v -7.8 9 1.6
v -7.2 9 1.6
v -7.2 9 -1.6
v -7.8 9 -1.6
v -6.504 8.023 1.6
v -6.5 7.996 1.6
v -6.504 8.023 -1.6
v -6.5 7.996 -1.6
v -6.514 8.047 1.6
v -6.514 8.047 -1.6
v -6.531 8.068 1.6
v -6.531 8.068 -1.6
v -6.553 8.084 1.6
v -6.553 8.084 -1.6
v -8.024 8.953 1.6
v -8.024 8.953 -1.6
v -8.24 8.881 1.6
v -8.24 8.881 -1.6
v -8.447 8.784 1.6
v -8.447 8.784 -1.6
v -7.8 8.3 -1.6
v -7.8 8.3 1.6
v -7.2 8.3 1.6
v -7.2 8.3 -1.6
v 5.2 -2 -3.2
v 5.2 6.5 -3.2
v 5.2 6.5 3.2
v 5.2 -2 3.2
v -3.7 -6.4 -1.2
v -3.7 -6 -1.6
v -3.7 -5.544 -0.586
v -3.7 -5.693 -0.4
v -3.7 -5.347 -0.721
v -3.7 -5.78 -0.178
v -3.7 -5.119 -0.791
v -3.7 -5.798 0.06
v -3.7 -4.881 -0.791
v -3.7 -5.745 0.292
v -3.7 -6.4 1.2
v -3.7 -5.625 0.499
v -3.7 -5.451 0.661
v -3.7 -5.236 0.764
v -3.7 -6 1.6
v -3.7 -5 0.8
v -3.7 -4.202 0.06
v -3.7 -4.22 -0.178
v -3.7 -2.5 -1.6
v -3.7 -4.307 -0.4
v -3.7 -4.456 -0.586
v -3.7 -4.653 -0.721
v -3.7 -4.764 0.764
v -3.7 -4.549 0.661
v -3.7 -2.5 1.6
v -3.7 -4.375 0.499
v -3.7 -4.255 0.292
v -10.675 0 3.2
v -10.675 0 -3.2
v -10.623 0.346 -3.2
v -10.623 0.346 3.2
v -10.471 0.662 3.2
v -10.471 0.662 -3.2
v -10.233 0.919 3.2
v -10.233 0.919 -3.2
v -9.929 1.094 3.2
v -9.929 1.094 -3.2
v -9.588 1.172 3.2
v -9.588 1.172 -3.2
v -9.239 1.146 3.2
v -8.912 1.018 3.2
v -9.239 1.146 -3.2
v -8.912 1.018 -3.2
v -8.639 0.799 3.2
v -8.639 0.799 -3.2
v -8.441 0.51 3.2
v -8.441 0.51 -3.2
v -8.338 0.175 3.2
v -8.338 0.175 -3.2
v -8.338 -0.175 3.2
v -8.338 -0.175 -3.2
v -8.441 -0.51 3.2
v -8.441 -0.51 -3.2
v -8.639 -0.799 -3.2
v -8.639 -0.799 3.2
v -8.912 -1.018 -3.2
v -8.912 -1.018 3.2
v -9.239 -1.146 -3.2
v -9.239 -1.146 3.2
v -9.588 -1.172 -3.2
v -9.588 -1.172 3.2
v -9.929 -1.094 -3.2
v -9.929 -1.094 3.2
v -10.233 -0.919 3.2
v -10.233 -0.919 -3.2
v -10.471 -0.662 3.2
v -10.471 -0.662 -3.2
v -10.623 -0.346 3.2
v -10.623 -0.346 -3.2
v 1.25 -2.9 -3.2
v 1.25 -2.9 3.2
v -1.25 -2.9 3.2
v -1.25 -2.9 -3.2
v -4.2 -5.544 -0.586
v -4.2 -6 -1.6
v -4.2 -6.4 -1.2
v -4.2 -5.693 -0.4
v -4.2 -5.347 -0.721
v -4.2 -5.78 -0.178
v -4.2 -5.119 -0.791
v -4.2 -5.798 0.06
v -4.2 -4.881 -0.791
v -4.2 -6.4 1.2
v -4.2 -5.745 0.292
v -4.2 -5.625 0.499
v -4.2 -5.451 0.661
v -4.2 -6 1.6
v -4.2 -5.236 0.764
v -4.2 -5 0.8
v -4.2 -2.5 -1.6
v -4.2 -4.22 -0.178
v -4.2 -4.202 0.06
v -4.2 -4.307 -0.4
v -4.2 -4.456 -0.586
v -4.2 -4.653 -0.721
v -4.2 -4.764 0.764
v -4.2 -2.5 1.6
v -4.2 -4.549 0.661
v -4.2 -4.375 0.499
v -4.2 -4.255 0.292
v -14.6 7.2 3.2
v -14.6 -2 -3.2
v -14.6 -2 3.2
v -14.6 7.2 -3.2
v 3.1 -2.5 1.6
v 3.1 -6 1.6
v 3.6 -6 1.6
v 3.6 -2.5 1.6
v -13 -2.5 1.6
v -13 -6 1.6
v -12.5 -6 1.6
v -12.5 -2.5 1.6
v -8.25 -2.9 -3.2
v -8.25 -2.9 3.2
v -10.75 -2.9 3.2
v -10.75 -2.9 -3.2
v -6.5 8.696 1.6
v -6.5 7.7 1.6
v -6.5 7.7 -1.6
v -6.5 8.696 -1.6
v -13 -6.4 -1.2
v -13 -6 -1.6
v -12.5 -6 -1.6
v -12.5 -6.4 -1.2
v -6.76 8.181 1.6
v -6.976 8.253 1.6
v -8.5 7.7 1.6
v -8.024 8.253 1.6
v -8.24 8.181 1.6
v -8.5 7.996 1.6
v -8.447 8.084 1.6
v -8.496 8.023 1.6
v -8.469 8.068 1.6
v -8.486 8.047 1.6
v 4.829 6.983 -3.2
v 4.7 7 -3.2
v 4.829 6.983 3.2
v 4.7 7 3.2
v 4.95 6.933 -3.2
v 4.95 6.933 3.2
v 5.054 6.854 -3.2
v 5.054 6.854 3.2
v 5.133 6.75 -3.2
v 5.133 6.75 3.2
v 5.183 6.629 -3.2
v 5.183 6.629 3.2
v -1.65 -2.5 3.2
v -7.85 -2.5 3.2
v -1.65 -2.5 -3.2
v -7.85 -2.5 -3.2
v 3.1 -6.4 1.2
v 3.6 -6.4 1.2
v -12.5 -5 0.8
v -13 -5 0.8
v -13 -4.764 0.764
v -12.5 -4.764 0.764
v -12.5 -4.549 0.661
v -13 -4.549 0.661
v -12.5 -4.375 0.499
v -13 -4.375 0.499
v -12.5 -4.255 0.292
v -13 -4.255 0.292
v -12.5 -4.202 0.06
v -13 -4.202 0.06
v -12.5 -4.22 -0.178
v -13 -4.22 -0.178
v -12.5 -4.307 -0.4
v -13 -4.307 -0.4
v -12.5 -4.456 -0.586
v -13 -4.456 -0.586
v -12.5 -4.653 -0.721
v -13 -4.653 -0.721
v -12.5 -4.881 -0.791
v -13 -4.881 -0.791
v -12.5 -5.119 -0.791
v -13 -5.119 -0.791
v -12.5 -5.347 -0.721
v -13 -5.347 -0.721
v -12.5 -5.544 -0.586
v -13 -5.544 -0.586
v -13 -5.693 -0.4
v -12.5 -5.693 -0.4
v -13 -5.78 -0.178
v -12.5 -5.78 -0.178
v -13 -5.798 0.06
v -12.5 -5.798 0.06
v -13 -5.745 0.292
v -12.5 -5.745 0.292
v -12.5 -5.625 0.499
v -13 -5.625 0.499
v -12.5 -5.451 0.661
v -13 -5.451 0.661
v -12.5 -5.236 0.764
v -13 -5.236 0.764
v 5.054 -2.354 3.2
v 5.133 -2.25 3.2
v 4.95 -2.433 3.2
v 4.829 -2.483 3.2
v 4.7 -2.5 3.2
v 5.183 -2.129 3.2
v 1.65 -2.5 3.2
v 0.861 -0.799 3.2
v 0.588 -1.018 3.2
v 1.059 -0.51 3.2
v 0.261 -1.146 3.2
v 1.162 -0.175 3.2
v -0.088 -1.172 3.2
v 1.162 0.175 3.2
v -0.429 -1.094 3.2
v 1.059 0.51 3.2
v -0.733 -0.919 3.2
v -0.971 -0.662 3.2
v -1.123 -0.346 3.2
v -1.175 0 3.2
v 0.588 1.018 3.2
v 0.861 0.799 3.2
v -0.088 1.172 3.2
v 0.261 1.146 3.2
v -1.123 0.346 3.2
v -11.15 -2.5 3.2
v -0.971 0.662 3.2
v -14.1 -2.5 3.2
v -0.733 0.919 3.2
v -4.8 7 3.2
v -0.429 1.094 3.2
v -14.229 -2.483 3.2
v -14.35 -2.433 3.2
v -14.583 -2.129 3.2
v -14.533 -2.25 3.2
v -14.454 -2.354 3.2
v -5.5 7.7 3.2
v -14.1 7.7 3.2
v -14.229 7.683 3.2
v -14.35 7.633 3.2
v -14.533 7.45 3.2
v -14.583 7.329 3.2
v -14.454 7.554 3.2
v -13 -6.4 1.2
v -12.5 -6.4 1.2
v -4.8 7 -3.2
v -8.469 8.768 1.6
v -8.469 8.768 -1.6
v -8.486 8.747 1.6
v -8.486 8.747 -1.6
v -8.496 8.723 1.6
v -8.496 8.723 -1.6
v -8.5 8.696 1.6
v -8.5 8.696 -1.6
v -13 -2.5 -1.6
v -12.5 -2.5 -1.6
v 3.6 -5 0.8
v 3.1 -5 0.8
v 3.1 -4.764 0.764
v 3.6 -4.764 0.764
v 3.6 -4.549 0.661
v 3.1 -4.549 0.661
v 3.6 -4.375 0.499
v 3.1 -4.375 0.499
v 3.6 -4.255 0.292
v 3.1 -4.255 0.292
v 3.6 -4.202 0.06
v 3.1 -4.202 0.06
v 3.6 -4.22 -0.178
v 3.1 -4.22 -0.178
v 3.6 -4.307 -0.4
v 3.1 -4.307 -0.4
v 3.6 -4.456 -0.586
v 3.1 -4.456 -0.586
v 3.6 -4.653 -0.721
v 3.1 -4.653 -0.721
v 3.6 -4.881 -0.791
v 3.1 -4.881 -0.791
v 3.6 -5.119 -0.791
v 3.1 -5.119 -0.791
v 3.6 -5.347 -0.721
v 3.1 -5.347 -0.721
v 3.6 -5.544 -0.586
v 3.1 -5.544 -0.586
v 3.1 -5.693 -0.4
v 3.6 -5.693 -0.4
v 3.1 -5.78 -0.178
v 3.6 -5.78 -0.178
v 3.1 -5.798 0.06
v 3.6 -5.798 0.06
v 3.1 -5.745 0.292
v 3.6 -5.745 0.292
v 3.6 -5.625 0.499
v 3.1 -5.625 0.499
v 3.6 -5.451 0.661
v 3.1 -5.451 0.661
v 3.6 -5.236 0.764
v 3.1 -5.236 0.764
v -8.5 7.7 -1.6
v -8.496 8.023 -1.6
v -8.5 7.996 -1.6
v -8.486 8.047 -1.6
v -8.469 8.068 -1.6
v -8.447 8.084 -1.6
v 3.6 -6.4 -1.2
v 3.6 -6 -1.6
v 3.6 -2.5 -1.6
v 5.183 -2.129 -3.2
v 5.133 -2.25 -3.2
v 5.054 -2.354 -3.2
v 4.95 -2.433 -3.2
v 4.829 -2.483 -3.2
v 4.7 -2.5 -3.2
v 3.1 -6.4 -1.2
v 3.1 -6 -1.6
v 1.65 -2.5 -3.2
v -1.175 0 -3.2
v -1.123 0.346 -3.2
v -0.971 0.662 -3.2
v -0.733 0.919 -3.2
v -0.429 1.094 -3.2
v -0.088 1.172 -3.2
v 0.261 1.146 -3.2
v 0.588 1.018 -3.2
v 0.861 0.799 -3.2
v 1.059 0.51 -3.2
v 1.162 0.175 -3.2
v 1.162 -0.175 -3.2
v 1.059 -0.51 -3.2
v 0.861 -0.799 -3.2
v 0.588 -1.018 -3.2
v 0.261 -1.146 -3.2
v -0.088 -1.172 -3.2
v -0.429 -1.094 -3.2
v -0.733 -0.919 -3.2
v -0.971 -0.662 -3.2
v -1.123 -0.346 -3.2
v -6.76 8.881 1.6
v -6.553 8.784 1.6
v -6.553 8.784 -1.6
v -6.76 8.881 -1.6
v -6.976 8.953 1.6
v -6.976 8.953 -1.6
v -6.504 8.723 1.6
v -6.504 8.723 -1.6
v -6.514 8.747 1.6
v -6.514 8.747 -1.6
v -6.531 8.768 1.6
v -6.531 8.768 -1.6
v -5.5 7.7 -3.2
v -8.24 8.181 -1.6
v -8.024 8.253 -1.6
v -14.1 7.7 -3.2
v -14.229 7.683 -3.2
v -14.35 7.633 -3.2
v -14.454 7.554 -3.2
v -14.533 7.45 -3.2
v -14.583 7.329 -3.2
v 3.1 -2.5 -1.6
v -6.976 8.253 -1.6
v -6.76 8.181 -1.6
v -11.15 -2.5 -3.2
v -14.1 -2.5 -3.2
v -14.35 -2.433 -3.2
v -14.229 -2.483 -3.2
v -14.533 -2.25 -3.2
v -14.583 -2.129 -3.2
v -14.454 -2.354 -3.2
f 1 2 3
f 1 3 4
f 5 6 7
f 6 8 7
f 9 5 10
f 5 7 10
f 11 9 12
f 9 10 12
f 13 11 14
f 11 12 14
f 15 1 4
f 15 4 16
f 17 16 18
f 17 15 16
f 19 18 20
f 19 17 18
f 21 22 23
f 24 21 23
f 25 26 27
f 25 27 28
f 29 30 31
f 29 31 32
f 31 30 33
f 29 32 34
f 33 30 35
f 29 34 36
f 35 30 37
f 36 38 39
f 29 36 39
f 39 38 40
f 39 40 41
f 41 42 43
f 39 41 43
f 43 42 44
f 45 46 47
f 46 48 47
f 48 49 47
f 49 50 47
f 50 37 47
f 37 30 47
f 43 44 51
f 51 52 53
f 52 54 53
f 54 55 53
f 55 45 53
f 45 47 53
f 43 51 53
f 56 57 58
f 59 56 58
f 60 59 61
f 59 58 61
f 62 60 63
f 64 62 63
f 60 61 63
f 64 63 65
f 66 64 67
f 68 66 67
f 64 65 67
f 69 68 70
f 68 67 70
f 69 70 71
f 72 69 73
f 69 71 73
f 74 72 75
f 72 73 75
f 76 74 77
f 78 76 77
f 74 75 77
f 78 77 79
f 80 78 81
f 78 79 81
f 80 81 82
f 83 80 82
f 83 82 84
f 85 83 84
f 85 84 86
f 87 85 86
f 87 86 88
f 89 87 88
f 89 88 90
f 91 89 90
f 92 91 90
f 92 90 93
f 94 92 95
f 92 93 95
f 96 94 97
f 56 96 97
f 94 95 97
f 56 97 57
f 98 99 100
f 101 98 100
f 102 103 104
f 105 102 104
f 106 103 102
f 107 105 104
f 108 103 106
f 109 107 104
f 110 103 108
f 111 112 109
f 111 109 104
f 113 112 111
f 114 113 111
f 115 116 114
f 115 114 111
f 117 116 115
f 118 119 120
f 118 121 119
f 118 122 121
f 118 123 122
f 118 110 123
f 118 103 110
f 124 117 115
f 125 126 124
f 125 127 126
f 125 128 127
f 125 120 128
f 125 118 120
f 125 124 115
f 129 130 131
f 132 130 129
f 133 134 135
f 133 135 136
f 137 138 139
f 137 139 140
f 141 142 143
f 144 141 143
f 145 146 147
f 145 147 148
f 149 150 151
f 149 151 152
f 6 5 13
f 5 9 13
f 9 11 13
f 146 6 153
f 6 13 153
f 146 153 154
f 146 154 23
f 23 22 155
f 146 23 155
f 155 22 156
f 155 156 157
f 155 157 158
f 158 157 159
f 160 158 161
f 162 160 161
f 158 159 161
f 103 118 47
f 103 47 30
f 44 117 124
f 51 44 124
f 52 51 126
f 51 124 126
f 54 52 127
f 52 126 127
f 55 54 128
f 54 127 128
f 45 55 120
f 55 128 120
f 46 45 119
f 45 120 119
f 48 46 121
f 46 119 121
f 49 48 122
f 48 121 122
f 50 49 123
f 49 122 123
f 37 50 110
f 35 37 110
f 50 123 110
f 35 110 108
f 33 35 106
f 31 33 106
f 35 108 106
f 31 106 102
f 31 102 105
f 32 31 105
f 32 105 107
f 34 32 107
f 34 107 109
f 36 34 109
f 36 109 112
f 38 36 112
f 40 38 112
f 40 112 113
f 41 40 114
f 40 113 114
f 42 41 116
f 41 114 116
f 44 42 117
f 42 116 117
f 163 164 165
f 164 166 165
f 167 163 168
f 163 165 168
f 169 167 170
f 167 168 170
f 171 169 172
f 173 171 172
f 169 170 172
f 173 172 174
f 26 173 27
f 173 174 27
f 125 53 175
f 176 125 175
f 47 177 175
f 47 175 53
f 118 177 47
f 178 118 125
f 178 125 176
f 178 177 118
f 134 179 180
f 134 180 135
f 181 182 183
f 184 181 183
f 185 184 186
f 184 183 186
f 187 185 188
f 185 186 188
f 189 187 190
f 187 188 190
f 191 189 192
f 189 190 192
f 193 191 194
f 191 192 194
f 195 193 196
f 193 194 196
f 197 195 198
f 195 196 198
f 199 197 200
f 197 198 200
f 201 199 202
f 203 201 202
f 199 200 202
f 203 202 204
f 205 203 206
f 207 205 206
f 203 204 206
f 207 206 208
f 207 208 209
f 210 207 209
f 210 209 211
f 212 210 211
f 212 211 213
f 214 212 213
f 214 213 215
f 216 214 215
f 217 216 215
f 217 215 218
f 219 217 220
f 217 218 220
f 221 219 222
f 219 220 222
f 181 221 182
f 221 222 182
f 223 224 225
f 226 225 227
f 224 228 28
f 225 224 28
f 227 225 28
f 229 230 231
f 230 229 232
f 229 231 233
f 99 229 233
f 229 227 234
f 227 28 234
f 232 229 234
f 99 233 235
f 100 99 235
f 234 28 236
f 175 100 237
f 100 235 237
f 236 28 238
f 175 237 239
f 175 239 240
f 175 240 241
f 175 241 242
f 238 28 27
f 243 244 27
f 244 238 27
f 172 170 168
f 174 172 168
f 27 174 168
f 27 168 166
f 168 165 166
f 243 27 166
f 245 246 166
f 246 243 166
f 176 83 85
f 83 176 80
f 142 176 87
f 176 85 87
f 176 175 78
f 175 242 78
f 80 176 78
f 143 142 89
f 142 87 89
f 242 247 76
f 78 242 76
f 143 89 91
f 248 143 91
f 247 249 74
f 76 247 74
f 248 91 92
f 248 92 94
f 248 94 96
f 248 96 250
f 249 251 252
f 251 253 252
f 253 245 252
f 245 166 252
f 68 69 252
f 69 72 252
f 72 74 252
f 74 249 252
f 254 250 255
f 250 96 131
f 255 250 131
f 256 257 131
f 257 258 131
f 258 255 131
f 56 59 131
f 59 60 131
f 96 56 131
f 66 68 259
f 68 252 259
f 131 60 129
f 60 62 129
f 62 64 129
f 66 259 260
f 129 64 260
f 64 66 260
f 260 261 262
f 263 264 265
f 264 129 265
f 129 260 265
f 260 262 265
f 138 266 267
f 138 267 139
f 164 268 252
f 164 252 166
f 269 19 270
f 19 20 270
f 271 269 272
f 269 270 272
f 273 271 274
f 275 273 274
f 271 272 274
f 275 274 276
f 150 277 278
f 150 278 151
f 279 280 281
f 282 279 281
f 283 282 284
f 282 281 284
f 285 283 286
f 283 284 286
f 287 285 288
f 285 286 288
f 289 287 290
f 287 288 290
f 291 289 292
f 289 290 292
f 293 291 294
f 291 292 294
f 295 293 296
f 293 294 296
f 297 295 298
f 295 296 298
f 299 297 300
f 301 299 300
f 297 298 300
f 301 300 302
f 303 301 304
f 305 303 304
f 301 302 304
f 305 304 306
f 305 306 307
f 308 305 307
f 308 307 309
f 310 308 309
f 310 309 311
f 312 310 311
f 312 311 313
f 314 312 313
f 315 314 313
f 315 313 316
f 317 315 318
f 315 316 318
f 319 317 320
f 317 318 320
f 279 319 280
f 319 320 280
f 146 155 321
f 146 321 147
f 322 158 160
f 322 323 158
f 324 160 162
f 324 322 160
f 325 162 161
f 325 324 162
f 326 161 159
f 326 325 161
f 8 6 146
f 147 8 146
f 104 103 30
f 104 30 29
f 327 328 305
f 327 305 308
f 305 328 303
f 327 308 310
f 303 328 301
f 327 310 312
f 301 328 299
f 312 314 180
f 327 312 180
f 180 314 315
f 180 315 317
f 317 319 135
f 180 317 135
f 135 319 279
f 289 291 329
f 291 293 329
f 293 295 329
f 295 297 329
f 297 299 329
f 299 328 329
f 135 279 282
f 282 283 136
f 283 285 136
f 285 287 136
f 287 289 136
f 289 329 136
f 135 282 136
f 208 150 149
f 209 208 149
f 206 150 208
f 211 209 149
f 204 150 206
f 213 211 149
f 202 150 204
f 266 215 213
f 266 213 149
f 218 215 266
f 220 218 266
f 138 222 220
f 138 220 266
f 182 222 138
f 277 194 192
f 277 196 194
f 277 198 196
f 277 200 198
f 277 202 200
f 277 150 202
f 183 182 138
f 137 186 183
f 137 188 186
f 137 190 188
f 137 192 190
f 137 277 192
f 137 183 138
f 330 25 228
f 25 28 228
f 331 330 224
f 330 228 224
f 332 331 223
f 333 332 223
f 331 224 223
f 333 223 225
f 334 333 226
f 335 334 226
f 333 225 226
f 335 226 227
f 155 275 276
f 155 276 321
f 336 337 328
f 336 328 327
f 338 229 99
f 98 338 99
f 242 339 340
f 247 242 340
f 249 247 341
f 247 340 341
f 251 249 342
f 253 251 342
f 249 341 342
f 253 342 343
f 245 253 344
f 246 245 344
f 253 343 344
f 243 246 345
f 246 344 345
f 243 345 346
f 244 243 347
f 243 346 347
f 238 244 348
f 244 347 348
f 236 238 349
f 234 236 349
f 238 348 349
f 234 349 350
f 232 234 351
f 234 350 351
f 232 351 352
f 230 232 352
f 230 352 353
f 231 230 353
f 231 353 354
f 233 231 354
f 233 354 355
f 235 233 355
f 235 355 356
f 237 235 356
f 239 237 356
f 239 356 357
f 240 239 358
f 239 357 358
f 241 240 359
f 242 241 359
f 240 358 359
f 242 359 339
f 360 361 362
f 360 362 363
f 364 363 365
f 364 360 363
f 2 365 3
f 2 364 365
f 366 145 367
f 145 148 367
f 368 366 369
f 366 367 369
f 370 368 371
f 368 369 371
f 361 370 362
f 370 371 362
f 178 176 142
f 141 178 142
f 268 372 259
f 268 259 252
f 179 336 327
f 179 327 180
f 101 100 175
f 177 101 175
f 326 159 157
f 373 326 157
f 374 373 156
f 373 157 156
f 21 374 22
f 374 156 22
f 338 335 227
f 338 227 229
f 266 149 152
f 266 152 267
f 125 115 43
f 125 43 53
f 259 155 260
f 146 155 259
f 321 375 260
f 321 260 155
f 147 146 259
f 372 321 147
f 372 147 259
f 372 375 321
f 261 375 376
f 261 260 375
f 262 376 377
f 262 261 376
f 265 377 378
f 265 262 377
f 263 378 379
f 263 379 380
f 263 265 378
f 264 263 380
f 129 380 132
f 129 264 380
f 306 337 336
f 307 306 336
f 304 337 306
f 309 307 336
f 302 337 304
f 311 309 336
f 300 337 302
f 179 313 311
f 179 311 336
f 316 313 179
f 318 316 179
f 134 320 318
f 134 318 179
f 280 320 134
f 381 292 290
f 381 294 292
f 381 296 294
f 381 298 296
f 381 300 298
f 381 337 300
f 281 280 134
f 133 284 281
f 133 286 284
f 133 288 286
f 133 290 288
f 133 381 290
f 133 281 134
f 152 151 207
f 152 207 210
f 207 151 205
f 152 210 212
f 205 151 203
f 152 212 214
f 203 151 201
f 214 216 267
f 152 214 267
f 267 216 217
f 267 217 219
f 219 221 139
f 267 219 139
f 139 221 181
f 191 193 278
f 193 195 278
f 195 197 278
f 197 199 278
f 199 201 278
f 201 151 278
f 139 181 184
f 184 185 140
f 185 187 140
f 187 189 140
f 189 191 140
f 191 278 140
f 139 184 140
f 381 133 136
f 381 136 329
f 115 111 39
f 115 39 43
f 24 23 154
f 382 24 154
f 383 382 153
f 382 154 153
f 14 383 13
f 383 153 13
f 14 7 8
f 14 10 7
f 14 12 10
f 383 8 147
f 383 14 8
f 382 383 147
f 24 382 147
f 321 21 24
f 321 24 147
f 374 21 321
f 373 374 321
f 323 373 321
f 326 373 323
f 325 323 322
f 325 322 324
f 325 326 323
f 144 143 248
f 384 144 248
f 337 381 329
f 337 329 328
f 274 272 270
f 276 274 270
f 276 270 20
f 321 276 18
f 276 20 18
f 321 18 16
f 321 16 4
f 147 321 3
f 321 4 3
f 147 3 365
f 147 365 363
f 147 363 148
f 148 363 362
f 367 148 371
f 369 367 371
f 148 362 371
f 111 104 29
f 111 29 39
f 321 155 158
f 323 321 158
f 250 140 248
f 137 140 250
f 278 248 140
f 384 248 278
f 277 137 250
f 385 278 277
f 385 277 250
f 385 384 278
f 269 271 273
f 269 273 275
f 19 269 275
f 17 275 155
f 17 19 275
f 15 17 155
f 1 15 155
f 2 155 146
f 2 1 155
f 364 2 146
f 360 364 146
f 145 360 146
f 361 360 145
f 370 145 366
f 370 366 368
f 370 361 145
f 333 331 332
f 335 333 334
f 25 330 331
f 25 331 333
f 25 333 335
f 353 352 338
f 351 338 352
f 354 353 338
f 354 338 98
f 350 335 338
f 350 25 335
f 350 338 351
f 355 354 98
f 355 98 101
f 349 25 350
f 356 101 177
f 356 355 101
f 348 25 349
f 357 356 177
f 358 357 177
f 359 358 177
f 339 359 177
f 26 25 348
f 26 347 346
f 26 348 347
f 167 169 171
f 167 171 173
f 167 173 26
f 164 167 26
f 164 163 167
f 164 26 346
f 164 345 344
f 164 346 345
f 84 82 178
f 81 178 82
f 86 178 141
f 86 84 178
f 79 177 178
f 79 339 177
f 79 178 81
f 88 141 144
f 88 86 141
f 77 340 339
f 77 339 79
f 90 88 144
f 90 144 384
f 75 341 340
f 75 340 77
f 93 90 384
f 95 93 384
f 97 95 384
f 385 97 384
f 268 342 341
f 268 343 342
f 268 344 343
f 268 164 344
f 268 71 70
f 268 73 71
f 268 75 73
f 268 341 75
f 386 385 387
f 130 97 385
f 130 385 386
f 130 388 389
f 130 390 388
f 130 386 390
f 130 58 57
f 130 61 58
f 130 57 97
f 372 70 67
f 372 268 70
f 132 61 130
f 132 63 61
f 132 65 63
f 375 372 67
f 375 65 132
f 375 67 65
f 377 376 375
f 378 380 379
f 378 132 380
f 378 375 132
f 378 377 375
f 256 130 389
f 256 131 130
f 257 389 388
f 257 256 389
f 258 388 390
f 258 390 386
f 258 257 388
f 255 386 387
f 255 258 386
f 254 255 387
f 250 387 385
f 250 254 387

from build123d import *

# Parameters (mm, degrees)
CROQUIS1_R              = 1.175
SALIENTE_EXTRUIR2_DEPTH = 6.4
SALIENTE_EXTRUIR3_START = -1.6
SALIENTE_EXTRUIR3_DEPTH = 3.2
SALIENTE_EXTRUIR4_START = -1.6
SALIENTE_EXTRUIR4_DEPTH = 3.2
REDONDEO1_R             = 0.1
REDONDEO2_R             = 0.1
SALIENTE_EXTRUIR5_DEPTH = 6.4
SALIENTE_EXTRUIR6_START = -1.6
CROQUIS5_R              = 0.8
SALIENTE_EXTRUIR6_DEPTH = 0.5
SALIENTE_EXTRUIR7_START = -17.7
CROQUIS5_2_R            = 0.8
SALIENTE_EXTRUIR7_DEPTH = 0.5
SALIENTE_EXTRUIR8_START = -10.4
CROQUIS5_3_R            = 0.8
SALIENTE_EXTRUIR8_DEPTH = 0.5
REDONDEO3_R             = 0.5


# Read off the part's stored shape, not the designer's step: SS_01_BASE-1-surface1
with BuildPart() as part:
    # Croquis1 → Saliente-Extruir2 (new body)
    with BuildSketch(Plane(origin=(0, 0, -3.2), x_dir=(-1, 0, 0), z_dir=(0, 0, -1))):
        Polygon((14.6, -2.5), (14.6, 7.7), (5.5, 7.7), (4.8, 7), (-5.2, 7), (-5.2, -2.5), align=None)
        Circle(CROQUIS1_R, mode=Mode.SUBTRACT)
        with Locations((9.5, 0)):
            Circle(CROQUIS1_R, mode=Mode.SUBTRACT)
    extrude(amount=-SALIENTE_EXTRUIR2_DEPTH)

    # Croquis2 → Saliente-Extruir3 (add)
    with BuildSketch(Plane.XY.offset(3.2).offset(SALIENTE_EXTRUIR3_START)):
        with BuildLine():
            Line((-8.5, 7.7), (-8.5, 8.054678814))
            ThreePointArc((-8.5, 8.054678814), (-8.161472313, 8.21007453), (-7.8, 8.3))
            Line((-7.8, 8.3), (-7.2, 8.3))
            ThreePointArc((-7.2, 8.3), (-6.838527687, 8.21007453), (-6.5, 8.054678814))
            Line((-6.5, 8.054678814), (-6.5, 7.7))
            Line((-6.5, 7.7), (-8.5, 7.7))
        make_face()
    extrude(amount=-SALIENTE_EXTRUIR3_DEPTH)

    # Redondeo2
    redondeo2_edges = [part.edges().sort_by_distance(p)[0] for p in [
        (-8.5, 8.054678814, 0),
        (-6.5, 8.054678814, 0),
    ]]
    fillet(redondeo2_edges, radius=REDONDEO2_R)

    # Croquis4 → Saliente-Extruir5 (add)
    with BuildSketch(Plane.XY.offset(3.2)):
        Polygon((-11.15, -2.5), (-7.85, -2.5), (-8.25, -2.9), (-10.75, -2.9), align=None)
        Polygon((-1.65, -2.5), (1.65, -2.5), (1.25, -2.9), (-1.25, -2.9), align=None)
    extrude(amount=-SALIENTE_EXTRUIR5_DEPTH)

    # Croquis5 → Saliente-Extruir6 (add)
    with BuildSketch(Plane.ZY.offset(14.6).offset(SALIENTE_EXTRUIR6_START)):
        Polygon((-1.6, -2.5), (-1.6, -6), (-1.2, -6.4), (1.2, -6.4), (1.6, -6), (1.6, -2.5), align=None)
        with Locations((0, -5)):
            Circle(CROQUIS5_R, mode=Mode.SUBTRACT)
    extrude(amount=-SALIENTE_EXTRUIR6_DEPTH)

    # Croquis5<3> → Saliente-Extruir8 (add)
    with BuildSketch(Plane.ZY.offset(14.6).offset(SALIENTE_EXTRUIR8_START)):
        Polygon((-1.6, -2.5), (-1.6, -6), (-1.2, -6.4), (1.2, -6.4), (1.6, -6), (1.6, -2.5), align=None)
        with Locations((0, -5)):
            Circle(CROQUIS5_3_R, mode=Mode.SUBTRACT)
    extrude(amount=-SALIENTE_EXTRUIR8_DEPTH)

    # Redondeo3
    redondeo3_edges = [part.edges().sort_by_distance(p)[0] for p in [
        (-14.6, 7.7, 0),
        (-14.6, -2.5, 0),
        (5.2, -2.5, 0),
        (5.2, 7, 0),
    ]]
    fillet(redondeo3_edges, radius=REDONDEO3_R)


with BuildPart() as body_2:
    # Croquis3 → Saliente-Extruir4 (new body)
    with BuildSketch(Plane.XY.offset(3.2).offset(SALIENTE_EXTRUIR4_START)):
        with BuildLine():
            Line((-8.5, 7.7), (-6.5, 7.7))
            Line((-6.5, 7.7), (-6.5, 8.754678814))
            ThreePointArc((-6.5, 8.754678814), (-6.838527687, 8.91007453), (-7.2, 9))
            Line((-7.2, 9), (-7.8, 9))
            ThreePointArc((-7.8, 9), (-8.161472313, 8.91007453), (-8.5, 8.754678814))
            Line((-8.5, 8.754678814), (-8.5, 7.7))
        make_face()
    extrude(amount=-SALIENTE_EXTRUIR4_DEPTH)

    # Redondeo1
    redondeo1_edges = [body_2.edges().sort_by_distance(p)[0] for p in [
        (-8.5, 8.754678814, 0),
        (-6.5, 8.754678814, 0),
    ]]
    fillet(redondeo1_edges, radius=REDONDEO1_R)


with BuildPart() as body_3:
    # Croquis5<2> → Saliente-Extruir7 (new body)
    with BuildSketch(Plane.ZY.offset(14.6).offset(SALIENTE_EXTRUIR7_START)):
        Polygon((-1.6, -2.5), (-1.6, -6), (-1.2, -6.4), (1.2, -6.4), (1.6, -6), (1.6, -2.5), align=None)
        with Locations((0, -5)):
            Circle(CROQUIS5_2_R, mode=Mode.SUBTRACT)
    extrude(amount=-SALIENTE_EXTRUIR7_DEPTH)


solid = Compound([part.part, body_2.part, body_3.part])
